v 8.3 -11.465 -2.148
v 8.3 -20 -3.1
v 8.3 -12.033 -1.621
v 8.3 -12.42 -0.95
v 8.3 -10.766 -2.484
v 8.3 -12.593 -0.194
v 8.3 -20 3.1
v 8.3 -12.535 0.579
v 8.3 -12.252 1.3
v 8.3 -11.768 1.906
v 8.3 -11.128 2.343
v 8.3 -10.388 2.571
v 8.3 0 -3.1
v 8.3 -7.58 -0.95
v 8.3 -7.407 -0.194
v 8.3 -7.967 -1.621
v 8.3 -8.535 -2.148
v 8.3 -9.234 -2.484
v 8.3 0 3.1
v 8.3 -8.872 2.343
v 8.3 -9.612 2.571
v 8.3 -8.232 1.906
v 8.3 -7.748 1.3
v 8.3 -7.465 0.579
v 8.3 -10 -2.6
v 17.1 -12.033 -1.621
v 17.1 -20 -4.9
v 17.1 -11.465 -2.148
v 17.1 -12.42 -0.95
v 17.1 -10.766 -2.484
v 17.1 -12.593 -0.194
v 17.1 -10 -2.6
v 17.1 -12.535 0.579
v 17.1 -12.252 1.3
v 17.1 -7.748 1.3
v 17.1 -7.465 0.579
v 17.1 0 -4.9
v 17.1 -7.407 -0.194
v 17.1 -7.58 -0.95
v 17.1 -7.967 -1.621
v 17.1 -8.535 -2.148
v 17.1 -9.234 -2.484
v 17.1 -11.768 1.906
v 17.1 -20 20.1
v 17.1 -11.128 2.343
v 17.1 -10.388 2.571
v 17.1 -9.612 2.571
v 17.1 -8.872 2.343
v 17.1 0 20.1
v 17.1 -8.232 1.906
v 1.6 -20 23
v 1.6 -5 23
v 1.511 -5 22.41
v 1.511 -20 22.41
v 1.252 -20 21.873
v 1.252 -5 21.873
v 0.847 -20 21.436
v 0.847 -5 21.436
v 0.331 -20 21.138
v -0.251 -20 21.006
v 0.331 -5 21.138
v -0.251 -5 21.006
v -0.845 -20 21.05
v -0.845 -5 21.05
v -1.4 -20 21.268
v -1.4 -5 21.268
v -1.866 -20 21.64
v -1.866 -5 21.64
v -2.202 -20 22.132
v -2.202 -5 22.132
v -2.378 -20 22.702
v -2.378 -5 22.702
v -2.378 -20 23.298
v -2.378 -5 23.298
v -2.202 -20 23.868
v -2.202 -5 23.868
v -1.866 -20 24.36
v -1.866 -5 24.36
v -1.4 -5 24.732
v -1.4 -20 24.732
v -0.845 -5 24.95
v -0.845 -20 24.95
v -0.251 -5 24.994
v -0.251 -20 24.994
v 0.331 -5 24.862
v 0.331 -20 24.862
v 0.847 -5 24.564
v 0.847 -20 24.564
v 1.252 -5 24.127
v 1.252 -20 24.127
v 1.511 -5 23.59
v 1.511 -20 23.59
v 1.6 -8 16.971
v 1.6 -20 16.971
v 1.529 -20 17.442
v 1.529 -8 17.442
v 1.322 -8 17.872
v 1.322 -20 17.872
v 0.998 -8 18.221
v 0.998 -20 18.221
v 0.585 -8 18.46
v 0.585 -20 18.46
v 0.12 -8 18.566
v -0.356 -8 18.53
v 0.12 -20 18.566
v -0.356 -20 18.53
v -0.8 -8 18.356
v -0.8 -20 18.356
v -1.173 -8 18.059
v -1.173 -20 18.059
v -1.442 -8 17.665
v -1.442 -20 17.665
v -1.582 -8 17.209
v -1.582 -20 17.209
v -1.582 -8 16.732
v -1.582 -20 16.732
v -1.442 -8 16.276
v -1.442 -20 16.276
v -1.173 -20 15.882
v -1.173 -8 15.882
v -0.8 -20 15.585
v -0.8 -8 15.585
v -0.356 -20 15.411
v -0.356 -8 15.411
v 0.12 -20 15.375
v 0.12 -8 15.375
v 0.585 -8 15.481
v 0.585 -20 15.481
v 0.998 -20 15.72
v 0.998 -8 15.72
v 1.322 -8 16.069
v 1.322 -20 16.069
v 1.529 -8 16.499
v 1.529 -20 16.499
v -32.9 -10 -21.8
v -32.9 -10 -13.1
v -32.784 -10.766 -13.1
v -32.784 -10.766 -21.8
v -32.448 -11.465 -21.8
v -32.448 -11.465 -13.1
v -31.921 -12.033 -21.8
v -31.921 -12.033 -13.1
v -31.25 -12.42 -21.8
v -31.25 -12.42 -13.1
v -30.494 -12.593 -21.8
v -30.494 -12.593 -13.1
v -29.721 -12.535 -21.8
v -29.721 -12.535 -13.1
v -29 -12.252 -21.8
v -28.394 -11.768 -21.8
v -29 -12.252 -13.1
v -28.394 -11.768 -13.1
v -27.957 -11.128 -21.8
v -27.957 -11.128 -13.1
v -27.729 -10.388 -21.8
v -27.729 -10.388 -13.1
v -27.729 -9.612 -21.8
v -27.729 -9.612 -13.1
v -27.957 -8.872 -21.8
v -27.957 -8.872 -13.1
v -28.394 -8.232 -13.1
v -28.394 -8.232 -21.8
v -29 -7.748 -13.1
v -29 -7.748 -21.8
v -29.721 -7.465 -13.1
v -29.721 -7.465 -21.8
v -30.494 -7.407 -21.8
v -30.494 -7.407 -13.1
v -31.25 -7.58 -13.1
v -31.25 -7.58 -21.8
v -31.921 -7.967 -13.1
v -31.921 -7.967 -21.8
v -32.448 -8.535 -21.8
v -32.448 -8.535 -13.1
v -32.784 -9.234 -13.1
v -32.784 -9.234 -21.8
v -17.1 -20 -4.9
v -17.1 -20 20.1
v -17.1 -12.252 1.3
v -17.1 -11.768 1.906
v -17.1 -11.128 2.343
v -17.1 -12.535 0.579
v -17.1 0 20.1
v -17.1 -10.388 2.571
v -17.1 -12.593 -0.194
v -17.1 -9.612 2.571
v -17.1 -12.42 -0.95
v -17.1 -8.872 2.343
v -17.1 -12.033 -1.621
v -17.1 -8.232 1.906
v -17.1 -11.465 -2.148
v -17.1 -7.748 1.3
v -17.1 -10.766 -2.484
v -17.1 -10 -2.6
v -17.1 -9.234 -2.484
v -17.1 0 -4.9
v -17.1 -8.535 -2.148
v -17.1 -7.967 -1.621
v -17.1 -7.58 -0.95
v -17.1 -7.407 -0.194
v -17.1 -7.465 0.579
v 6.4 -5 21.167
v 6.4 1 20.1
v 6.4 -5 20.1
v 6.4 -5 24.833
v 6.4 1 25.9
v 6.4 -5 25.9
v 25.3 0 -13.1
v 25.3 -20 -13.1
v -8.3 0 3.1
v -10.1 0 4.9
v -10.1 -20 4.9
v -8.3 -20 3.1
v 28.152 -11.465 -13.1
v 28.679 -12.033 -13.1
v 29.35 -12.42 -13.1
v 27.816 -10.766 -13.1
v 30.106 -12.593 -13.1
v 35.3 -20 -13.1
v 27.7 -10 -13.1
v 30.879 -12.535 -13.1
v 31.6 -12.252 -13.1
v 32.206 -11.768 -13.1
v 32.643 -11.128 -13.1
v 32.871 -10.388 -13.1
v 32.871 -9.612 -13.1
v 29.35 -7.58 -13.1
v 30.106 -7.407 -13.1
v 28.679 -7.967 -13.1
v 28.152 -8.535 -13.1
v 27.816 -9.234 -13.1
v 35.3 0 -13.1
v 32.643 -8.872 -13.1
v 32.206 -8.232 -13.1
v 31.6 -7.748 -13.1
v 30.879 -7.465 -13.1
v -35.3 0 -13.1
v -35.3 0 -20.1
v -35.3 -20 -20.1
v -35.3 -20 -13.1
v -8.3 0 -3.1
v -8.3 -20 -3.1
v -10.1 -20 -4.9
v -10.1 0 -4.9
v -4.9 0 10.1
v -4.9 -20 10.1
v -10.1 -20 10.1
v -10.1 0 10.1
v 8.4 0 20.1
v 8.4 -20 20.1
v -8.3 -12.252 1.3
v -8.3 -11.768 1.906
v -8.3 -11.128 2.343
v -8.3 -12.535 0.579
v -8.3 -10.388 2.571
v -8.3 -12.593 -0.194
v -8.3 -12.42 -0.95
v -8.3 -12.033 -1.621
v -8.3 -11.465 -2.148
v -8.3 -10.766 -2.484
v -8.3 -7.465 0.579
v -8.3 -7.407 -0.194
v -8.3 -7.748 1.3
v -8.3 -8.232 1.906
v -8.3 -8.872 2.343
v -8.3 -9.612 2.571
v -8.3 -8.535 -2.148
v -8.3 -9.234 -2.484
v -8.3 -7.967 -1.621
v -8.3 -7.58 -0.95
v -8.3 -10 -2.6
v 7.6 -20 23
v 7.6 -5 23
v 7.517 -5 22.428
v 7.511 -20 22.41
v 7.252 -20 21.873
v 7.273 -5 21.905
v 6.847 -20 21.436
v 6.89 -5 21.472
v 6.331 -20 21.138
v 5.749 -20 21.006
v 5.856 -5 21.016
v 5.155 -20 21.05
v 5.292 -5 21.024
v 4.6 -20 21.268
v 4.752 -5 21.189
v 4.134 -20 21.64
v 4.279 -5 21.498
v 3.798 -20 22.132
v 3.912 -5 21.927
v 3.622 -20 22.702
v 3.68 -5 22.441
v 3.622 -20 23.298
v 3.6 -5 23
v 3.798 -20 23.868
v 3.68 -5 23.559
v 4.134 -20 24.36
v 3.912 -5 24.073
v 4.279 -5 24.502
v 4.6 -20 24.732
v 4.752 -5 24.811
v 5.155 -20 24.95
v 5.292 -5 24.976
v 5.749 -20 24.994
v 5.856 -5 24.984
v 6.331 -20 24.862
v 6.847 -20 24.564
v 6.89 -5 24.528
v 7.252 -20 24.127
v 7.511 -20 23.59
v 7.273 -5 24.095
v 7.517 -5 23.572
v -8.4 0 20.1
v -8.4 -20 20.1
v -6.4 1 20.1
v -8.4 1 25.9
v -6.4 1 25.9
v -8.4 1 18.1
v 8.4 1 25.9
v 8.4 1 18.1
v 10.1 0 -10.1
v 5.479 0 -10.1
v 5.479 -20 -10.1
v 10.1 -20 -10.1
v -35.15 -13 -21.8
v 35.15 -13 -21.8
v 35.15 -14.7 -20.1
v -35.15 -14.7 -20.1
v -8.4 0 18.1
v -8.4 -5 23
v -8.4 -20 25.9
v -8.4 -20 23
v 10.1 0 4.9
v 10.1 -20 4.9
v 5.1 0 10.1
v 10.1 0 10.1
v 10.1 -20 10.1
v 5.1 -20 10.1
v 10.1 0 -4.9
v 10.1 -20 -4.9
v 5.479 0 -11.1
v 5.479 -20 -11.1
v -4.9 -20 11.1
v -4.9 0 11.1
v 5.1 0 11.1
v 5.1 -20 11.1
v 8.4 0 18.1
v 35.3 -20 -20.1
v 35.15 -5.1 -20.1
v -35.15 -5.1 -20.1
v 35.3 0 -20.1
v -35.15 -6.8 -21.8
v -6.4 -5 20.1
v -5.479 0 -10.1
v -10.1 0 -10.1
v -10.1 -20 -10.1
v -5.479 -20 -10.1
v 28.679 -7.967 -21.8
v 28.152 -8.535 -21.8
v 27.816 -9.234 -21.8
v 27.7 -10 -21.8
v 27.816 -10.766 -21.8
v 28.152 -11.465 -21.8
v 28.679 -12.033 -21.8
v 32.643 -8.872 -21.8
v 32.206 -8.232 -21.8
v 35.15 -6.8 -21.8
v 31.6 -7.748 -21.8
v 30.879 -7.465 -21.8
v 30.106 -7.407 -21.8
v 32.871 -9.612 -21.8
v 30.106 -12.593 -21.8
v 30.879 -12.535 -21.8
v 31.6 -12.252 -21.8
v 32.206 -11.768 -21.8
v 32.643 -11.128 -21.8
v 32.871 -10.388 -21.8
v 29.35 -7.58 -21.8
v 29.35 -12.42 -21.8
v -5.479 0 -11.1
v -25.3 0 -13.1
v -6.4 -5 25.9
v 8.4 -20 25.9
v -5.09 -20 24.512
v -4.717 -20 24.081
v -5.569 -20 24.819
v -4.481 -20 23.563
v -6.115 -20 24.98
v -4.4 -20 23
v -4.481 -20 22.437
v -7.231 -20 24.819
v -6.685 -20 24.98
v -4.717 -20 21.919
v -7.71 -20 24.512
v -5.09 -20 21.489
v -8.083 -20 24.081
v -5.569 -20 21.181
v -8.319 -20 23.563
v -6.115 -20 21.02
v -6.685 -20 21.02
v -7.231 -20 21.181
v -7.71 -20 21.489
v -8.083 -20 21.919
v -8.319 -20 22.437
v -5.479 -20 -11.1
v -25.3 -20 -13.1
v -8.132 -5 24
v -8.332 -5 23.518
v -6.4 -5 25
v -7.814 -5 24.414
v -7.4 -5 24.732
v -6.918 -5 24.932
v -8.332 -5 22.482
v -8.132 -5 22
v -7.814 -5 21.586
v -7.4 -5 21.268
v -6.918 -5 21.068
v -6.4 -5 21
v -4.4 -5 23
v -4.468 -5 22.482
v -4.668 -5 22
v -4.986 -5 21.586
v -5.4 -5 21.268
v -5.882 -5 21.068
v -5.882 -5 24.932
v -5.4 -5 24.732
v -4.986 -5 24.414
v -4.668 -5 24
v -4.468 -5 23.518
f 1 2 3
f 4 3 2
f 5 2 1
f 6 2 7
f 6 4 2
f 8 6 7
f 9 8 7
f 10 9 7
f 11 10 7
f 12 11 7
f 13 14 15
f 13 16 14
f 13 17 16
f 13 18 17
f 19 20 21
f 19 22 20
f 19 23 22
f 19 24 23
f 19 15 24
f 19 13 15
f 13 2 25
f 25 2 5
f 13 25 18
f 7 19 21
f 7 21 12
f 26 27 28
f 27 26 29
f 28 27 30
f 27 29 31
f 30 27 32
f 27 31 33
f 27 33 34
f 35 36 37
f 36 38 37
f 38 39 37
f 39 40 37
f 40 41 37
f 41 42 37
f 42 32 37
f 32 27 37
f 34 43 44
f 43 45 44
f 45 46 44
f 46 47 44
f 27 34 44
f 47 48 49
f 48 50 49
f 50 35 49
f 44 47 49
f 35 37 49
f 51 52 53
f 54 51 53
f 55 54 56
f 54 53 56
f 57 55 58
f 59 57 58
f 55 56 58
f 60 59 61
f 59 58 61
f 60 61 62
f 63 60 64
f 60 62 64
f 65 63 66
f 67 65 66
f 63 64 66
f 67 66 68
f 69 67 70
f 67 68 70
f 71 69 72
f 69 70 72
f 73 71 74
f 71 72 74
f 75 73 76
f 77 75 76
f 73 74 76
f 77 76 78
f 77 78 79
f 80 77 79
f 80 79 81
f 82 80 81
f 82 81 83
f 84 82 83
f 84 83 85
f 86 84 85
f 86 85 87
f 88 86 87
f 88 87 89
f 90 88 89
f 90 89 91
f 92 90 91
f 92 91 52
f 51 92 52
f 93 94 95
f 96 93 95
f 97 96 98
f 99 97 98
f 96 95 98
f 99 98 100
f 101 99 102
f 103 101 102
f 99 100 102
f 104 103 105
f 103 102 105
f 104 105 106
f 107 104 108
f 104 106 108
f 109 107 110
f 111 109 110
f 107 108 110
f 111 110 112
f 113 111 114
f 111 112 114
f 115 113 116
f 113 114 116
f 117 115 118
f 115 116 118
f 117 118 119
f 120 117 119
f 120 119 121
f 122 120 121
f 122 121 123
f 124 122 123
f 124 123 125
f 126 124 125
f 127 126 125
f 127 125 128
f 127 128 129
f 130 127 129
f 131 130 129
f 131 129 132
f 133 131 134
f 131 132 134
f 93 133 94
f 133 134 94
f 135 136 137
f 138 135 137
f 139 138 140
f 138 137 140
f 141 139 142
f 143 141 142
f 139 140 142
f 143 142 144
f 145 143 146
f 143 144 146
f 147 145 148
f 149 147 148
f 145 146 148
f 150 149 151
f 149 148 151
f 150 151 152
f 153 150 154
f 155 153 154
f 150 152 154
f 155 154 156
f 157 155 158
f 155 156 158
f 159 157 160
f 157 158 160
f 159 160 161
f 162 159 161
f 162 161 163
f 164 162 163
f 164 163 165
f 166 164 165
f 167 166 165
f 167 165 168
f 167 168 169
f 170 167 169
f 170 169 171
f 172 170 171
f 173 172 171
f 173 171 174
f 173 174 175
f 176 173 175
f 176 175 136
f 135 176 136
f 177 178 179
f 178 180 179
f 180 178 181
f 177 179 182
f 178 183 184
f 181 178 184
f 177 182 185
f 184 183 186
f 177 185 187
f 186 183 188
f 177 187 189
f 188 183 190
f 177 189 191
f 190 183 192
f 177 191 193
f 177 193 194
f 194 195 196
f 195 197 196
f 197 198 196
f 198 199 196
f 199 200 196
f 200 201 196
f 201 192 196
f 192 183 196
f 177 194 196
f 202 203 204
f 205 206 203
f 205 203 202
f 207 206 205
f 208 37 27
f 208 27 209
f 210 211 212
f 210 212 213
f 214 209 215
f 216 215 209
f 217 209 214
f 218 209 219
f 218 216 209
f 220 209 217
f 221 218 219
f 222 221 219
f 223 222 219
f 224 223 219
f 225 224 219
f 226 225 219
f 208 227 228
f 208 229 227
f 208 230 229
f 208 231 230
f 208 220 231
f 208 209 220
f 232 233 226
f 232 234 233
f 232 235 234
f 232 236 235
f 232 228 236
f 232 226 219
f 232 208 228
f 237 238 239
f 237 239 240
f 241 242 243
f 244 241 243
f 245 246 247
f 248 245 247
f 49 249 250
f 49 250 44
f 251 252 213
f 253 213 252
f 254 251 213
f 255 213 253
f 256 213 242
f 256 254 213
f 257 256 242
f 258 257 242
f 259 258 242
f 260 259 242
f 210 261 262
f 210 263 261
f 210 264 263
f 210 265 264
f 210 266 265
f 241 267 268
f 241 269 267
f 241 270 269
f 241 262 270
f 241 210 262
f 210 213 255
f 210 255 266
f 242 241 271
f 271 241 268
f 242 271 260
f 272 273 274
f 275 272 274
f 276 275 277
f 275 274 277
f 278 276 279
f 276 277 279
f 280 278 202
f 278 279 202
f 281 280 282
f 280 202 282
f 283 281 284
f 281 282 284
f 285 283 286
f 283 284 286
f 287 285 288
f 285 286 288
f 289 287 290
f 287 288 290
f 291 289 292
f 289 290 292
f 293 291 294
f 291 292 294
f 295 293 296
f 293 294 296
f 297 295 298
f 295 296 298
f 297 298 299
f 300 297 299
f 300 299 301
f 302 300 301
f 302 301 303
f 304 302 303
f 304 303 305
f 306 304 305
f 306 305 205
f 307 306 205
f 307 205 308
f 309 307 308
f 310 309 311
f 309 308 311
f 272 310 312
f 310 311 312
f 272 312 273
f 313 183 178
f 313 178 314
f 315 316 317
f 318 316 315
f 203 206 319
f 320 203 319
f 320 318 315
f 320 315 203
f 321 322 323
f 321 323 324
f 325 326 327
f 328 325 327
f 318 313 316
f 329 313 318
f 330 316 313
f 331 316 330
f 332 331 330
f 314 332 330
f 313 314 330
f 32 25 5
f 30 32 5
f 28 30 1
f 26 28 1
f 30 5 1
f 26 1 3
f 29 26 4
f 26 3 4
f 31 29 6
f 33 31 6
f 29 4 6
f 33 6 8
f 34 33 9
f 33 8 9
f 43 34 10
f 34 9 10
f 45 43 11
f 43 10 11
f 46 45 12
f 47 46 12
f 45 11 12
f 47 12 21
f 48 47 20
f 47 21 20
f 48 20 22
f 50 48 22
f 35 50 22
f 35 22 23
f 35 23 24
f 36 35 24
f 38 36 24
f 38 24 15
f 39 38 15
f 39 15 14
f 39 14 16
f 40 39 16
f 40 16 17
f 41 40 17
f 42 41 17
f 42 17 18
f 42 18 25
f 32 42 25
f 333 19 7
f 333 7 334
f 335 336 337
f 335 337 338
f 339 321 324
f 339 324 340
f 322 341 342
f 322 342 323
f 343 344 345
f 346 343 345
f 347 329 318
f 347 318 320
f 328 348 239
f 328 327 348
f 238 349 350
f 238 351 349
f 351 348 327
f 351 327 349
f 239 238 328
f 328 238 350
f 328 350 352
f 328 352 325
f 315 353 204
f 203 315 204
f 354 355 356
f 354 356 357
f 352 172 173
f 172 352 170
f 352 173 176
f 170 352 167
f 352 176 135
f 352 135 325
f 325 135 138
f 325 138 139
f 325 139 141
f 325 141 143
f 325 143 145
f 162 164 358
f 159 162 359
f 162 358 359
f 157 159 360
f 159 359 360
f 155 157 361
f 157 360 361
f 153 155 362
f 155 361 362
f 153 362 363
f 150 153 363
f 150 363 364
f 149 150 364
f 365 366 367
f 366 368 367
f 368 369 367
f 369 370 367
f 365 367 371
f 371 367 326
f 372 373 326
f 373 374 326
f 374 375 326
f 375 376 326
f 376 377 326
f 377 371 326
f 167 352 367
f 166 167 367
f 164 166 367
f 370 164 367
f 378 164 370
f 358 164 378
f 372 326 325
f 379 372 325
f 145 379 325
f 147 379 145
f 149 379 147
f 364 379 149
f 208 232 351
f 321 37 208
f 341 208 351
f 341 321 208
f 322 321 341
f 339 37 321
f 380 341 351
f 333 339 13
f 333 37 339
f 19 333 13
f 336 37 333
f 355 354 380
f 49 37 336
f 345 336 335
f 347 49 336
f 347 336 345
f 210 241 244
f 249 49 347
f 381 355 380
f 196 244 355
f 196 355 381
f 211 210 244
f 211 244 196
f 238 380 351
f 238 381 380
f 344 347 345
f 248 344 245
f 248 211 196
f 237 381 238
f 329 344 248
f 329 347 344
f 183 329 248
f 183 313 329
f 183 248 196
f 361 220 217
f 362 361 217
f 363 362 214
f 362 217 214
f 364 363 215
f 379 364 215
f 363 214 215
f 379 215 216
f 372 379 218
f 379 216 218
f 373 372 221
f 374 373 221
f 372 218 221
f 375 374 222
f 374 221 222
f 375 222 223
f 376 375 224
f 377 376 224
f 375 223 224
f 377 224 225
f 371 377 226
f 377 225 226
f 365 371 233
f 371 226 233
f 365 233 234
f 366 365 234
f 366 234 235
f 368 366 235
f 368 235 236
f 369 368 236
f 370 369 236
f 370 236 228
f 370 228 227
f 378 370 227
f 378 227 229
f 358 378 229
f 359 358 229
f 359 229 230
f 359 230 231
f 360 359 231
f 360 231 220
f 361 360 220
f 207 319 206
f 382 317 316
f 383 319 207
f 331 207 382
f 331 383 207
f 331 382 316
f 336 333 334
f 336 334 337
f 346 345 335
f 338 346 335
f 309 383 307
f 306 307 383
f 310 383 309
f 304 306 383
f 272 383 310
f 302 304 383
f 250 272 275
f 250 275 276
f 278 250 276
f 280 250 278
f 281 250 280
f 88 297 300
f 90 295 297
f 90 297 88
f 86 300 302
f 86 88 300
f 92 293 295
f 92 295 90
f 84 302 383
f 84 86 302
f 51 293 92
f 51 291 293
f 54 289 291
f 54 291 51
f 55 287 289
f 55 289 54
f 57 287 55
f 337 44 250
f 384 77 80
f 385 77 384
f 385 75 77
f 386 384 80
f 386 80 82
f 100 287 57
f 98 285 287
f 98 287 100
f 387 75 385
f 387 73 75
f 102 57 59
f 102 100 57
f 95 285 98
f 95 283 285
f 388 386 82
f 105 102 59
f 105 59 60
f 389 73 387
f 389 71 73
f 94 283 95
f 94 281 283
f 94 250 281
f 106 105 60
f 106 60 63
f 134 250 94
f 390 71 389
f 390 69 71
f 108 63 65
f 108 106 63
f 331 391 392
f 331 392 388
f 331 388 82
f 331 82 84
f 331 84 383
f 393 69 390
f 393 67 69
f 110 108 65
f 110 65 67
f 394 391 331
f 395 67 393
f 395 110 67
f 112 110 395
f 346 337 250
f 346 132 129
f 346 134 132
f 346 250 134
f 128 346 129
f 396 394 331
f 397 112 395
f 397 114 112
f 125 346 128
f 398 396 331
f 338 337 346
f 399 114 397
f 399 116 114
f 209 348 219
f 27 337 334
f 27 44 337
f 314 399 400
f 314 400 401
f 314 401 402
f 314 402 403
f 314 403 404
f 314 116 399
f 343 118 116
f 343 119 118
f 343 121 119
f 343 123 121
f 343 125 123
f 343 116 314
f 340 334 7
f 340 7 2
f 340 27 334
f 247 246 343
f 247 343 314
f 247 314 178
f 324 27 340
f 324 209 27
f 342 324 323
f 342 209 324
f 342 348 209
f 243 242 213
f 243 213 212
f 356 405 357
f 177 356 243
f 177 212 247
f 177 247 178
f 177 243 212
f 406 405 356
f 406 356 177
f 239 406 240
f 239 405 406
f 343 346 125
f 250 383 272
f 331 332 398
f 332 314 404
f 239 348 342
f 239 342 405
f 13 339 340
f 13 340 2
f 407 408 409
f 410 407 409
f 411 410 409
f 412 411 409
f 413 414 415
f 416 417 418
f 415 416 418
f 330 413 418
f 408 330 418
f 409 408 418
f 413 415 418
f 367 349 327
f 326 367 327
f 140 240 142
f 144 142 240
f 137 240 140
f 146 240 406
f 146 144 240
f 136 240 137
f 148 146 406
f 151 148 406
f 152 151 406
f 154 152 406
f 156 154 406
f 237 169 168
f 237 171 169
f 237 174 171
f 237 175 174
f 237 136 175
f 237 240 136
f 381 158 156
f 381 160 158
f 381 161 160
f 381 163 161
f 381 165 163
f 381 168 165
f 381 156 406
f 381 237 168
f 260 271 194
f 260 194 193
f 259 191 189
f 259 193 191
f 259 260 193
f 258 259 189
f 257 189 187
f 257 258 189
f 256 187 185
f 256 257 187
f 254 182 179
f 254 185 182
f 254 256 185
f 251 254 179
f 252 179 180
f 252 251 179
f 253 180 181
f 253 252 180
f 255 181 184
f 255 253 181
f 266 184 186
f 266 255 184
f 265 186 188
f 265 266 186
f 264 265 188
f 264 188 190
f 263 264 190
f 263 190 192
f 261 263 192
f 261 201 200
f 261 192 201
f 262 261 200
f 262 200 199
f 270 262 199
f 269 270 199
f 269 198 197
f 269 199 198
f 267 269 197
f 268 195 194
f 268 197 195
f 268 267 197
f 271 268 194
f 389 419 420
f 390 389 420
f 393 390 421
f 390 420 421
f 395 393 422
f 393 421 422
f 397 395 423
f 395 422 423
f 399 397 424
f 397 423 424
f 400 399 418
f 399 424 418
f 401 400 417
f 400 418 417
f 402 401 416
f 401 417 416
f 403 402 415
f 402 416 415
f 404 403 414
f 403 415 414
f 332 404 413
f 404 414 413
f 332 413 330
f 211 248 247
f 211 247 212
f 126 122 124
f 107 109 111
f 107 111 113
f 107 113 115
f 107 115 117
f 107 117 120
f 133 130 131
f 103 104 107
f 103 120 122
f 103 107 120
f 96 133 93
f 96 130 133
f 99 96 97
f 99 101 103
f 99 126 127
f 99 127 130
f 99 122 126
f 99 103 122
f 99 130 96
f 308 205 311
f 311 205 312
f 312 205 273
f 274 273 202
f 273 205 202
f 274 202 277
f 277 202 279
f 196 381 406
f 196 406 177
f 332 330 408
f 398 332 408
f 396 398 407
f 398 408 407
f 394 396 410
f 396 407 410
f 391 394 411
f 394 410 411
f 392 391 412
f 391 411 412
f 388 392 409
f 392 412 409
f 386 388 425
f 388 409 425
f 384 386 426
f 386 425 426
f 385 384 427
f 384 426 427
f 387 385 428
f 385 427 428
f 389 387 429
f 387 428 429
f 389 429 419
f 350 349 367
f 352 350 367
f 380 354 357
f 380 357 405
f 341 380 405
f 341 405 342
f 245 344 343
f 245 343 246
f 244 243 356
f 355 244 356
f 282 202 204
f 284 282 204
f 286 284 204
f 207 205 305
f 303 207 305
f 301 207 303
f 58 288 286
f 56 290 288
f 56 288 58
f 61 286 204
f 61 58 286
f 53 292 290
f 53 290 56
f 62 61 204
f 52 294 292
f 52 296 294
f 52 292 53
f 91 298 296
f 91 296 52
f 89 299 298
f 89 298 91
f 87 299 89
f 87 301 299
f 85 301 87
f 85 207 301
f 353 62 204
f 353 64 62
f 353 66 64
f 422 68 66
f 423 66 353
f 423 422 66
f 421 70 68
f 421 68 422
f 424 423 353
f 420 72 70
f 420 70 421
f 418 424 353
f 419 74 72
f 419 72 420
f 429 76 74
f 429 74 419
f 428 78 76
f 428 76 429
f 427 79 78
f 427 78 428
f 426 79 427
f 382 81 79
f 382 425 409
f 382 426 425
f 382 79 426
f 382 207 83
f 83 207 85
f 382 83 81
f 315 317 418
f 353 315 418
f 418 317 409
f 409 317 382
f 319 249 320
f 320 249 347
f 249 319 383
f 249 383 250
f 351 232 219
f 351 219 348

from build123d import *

# Parameters (mm, degrees)
PAD004_DEPTH           = 20
SKETCH013_R            = 2.6
POCKET008_DEPTH        = 100
POCKET009_DEPTH        = 40
PAD005_DEPTH           = 70.3
SKETCH016_R            = 2.6
POCKET010_DEPTH        = 10
SKETCH017_R            = 2.6
POCKET011_DEPTH        = 10
SKETCH018_W            = 10
SKETCH018_H            = 1
POCKET012_DEPTH        = 25
SKETCH019_W            = 16.8
SKETCH019_H            = 21
PAD006_DEPTH           = 5.8
SKETCH020_W            = 12.8
SKETCH020_H            = 6
POCKET013_DEPTH        = 5.8
SKETCH021_W            = 16.8
SKETCH021_H            = 2
PAD007_DEPTH           = 1
SKETCH022_R            = 2
POCKET014_DEPTH        = 40
LINEARPATTERN001_COUNT = 3
LINEARPATTERN001_PITCH = 6
SKETCH023_R            = 1.6
POCKET015_DEPTH        = 12


with BuildPart() as part:
    # Sketch012 → Pad004 (new body)
    with BuildSketch(Plane.XZ):
        Polygon((17.1, 10.100008), (17.1, -4.899992), (25.3, -13.099992), (35.3, -13.099992), (35.3, -20.099992), (-35.3, -20.099992), (-35.3, -13.099992), (-25.3, -13.099992), (-17.1, -4.899992), (-17.1, 10.100008), (-17.1, 20.100008), (17.1, 20.100008), align=None)
        Polygon((-10.1, 10.100008), (-10.1, 4.900008), (-8.3, 3.099992), (-8.3, -3.100008), (-10.1, -4.899992), (-10.1, -10.099992), (-5.478931, -10.099992), (-5.478931, -11.099992), (5.478931, -11.099992), (5.478931, -10.099992), (10.1, -10.099992), (10.1, -4.899992), (8.3, -3.099992), (8.3, 3.100008), (10.1, 4.900008), (10.1, 10.100008), align=None, mode=Mode.SUBTRACT)
    extrude(amount=PAD004_DEPTH)

    # Sketch013 (on Face22 of Pad004) → Pocket008 (cut)
    with BuildSketch(Plane(origin=(8.3, 0, 0), x_dir=(0, 0, -1), z_dir=(-1, 0, 0))):
        with Locations((0, 10)):
            Circle(SKETCH013_R)
    extrude(amount=-POCKET008_DEPTH, mode=Mode.SUBTRACT)

    # Sketch013 (on Face22 of Pad004) → Pocket009 (cut)
    with BuildSketch(Plane(origin=(8.3, 0, 0), x_dir=(0, 0, -1), z_dir=(-1, 0, 0))):
        with Locations((0, 10)):
            Circle(SKETCH013_R)
    extrude(amount=POCKET009_DEPTH, mode=Mode.SUBTRACT)

    # Sketch015 → Pad005 (join)
    with BuildSketch(Plane(origin=(35.15, 0, 0), x_dir=(0, 0, 1), z_dir=(1, 0, 0))):
        Polygon((-20.000008, 14.8), (-20.000008, 5), (-21.800008, 6.8), (-21.800008, 13), align=None)
    extrude(amount=-PAD005_DEPTH)

    # Sketch016 (on Face3 of Pad005) → Pocket010 (cut)
    with BuildSketch(Plane(origin=(0, 0, -13.099992), x_dir=(-1, 0, 0), z_dir=(0, 0, 1))):
        with Locations((-30.3, 10)):
            Circle(SKETCH016_R)
    extrude(amount=-POCKET010_DEPTH, mode=Mode.SUBTRACT)

    # Sketch017 (on Face12 of Pocket010) → Pocket011 (cut)
    with BuildSketch(Plane(origin=(0, 0, -13.099992), x_dir=(-1, 0, 0), z_dir=(0, 0, 1))):
        with Locations((30.3, 10)):
            Circle(SKETCH017_R)
    extrude(amount=-POCKET011_DEPTH, mode=Mode.SUBTRACT)

    # Sketch018 (on Face4 of Pocket011) → Pocket012 (cut)
    with BuildSketch(Plane(origin=(0, 0, 0), x_dir=(1, 0, 0), z_dir=(0, 1, 0))):
        with Locations((0.1, -10.600008)):
            Rectangle(SKETCH018_W, SKETCH018_H)
    extrude(amount=-POCKET012_DEPTH, mode=Mode.SUBTRACT)

    # Sketch019 (on Face6 of Pocket012) → Pad006 (join)
    with BuildSketch(Plane(origin=(0, 0, 20.100008), x_dir=(-1, 0, 0), z_dir=(0, 0, 1))):
        with Locations((0, 9.5)):
            Rectangle(SKETCH019_W, SKETCH019_H)
    extrude(amount=PAD006_DEPTH)

    # Sketch020 (on Face46 of Pad006) → Pocket013 (cut)
    with BuildSketch(Plane(origin=(0, 0, 25.900008), x_dir=(-1, 0, 0), z_dir=(0, 0, 1))):
        with Locations((0, 2)):
            Rectangle(SKETCH020_W, SKETCH020_H)
    extrude(amount=-POCKET013_DEPTH, mode=Mode.SUBTRACT)

    # Sketch021 (on Face4 of Pocket013) → Pad007 (join)
    with BuildSketch(Plane(origin=(0, 0, 0), x_dir=(1, 0, 0), z_dir=(0, 1, 0))):
        with Locations((0, -19.100008)):
            Rectangle(SKETCH021_W, SKETCH021_H)
    extrude(amount=PAD007_DEPTH)

    # Sketch022 (on Face46 of Pad007) → Pocket014 (cut)
    with BuildSketch(Plane(origin=(0, -5, 0), x_dir=(1, 0, 0), z_dir=(0, 1, 0))):
        with Locations((-6.4, -23.000008)):
            Circle(SKETCH022_R)
    pocket014 = extrude(amount=-POCKET014_DEPTH, mode=Mode.SUBTRACT)

    # LinearPattern001: Pocket014 ×3
    with Locations(*[(i * LINEARPATTERN001_PITCH, 0, 0) for i in range(1, LINEARPATTERN001_COUNT)]):
        add(pocket014, mode=Mode.SUBTRACT)

    # Sketch023 (on Face5 of LinearPattern001) → Pocket015 (cut)
    with BuildSketch(Plane.XZ.offset(20)):
        with Locations((0, 16.970566)):
            Circle(SKETCH023_R)
    extrude(amount=-POCKET015_DEPTH, mode=Mode.SUBTRACT)


solid = part.part
